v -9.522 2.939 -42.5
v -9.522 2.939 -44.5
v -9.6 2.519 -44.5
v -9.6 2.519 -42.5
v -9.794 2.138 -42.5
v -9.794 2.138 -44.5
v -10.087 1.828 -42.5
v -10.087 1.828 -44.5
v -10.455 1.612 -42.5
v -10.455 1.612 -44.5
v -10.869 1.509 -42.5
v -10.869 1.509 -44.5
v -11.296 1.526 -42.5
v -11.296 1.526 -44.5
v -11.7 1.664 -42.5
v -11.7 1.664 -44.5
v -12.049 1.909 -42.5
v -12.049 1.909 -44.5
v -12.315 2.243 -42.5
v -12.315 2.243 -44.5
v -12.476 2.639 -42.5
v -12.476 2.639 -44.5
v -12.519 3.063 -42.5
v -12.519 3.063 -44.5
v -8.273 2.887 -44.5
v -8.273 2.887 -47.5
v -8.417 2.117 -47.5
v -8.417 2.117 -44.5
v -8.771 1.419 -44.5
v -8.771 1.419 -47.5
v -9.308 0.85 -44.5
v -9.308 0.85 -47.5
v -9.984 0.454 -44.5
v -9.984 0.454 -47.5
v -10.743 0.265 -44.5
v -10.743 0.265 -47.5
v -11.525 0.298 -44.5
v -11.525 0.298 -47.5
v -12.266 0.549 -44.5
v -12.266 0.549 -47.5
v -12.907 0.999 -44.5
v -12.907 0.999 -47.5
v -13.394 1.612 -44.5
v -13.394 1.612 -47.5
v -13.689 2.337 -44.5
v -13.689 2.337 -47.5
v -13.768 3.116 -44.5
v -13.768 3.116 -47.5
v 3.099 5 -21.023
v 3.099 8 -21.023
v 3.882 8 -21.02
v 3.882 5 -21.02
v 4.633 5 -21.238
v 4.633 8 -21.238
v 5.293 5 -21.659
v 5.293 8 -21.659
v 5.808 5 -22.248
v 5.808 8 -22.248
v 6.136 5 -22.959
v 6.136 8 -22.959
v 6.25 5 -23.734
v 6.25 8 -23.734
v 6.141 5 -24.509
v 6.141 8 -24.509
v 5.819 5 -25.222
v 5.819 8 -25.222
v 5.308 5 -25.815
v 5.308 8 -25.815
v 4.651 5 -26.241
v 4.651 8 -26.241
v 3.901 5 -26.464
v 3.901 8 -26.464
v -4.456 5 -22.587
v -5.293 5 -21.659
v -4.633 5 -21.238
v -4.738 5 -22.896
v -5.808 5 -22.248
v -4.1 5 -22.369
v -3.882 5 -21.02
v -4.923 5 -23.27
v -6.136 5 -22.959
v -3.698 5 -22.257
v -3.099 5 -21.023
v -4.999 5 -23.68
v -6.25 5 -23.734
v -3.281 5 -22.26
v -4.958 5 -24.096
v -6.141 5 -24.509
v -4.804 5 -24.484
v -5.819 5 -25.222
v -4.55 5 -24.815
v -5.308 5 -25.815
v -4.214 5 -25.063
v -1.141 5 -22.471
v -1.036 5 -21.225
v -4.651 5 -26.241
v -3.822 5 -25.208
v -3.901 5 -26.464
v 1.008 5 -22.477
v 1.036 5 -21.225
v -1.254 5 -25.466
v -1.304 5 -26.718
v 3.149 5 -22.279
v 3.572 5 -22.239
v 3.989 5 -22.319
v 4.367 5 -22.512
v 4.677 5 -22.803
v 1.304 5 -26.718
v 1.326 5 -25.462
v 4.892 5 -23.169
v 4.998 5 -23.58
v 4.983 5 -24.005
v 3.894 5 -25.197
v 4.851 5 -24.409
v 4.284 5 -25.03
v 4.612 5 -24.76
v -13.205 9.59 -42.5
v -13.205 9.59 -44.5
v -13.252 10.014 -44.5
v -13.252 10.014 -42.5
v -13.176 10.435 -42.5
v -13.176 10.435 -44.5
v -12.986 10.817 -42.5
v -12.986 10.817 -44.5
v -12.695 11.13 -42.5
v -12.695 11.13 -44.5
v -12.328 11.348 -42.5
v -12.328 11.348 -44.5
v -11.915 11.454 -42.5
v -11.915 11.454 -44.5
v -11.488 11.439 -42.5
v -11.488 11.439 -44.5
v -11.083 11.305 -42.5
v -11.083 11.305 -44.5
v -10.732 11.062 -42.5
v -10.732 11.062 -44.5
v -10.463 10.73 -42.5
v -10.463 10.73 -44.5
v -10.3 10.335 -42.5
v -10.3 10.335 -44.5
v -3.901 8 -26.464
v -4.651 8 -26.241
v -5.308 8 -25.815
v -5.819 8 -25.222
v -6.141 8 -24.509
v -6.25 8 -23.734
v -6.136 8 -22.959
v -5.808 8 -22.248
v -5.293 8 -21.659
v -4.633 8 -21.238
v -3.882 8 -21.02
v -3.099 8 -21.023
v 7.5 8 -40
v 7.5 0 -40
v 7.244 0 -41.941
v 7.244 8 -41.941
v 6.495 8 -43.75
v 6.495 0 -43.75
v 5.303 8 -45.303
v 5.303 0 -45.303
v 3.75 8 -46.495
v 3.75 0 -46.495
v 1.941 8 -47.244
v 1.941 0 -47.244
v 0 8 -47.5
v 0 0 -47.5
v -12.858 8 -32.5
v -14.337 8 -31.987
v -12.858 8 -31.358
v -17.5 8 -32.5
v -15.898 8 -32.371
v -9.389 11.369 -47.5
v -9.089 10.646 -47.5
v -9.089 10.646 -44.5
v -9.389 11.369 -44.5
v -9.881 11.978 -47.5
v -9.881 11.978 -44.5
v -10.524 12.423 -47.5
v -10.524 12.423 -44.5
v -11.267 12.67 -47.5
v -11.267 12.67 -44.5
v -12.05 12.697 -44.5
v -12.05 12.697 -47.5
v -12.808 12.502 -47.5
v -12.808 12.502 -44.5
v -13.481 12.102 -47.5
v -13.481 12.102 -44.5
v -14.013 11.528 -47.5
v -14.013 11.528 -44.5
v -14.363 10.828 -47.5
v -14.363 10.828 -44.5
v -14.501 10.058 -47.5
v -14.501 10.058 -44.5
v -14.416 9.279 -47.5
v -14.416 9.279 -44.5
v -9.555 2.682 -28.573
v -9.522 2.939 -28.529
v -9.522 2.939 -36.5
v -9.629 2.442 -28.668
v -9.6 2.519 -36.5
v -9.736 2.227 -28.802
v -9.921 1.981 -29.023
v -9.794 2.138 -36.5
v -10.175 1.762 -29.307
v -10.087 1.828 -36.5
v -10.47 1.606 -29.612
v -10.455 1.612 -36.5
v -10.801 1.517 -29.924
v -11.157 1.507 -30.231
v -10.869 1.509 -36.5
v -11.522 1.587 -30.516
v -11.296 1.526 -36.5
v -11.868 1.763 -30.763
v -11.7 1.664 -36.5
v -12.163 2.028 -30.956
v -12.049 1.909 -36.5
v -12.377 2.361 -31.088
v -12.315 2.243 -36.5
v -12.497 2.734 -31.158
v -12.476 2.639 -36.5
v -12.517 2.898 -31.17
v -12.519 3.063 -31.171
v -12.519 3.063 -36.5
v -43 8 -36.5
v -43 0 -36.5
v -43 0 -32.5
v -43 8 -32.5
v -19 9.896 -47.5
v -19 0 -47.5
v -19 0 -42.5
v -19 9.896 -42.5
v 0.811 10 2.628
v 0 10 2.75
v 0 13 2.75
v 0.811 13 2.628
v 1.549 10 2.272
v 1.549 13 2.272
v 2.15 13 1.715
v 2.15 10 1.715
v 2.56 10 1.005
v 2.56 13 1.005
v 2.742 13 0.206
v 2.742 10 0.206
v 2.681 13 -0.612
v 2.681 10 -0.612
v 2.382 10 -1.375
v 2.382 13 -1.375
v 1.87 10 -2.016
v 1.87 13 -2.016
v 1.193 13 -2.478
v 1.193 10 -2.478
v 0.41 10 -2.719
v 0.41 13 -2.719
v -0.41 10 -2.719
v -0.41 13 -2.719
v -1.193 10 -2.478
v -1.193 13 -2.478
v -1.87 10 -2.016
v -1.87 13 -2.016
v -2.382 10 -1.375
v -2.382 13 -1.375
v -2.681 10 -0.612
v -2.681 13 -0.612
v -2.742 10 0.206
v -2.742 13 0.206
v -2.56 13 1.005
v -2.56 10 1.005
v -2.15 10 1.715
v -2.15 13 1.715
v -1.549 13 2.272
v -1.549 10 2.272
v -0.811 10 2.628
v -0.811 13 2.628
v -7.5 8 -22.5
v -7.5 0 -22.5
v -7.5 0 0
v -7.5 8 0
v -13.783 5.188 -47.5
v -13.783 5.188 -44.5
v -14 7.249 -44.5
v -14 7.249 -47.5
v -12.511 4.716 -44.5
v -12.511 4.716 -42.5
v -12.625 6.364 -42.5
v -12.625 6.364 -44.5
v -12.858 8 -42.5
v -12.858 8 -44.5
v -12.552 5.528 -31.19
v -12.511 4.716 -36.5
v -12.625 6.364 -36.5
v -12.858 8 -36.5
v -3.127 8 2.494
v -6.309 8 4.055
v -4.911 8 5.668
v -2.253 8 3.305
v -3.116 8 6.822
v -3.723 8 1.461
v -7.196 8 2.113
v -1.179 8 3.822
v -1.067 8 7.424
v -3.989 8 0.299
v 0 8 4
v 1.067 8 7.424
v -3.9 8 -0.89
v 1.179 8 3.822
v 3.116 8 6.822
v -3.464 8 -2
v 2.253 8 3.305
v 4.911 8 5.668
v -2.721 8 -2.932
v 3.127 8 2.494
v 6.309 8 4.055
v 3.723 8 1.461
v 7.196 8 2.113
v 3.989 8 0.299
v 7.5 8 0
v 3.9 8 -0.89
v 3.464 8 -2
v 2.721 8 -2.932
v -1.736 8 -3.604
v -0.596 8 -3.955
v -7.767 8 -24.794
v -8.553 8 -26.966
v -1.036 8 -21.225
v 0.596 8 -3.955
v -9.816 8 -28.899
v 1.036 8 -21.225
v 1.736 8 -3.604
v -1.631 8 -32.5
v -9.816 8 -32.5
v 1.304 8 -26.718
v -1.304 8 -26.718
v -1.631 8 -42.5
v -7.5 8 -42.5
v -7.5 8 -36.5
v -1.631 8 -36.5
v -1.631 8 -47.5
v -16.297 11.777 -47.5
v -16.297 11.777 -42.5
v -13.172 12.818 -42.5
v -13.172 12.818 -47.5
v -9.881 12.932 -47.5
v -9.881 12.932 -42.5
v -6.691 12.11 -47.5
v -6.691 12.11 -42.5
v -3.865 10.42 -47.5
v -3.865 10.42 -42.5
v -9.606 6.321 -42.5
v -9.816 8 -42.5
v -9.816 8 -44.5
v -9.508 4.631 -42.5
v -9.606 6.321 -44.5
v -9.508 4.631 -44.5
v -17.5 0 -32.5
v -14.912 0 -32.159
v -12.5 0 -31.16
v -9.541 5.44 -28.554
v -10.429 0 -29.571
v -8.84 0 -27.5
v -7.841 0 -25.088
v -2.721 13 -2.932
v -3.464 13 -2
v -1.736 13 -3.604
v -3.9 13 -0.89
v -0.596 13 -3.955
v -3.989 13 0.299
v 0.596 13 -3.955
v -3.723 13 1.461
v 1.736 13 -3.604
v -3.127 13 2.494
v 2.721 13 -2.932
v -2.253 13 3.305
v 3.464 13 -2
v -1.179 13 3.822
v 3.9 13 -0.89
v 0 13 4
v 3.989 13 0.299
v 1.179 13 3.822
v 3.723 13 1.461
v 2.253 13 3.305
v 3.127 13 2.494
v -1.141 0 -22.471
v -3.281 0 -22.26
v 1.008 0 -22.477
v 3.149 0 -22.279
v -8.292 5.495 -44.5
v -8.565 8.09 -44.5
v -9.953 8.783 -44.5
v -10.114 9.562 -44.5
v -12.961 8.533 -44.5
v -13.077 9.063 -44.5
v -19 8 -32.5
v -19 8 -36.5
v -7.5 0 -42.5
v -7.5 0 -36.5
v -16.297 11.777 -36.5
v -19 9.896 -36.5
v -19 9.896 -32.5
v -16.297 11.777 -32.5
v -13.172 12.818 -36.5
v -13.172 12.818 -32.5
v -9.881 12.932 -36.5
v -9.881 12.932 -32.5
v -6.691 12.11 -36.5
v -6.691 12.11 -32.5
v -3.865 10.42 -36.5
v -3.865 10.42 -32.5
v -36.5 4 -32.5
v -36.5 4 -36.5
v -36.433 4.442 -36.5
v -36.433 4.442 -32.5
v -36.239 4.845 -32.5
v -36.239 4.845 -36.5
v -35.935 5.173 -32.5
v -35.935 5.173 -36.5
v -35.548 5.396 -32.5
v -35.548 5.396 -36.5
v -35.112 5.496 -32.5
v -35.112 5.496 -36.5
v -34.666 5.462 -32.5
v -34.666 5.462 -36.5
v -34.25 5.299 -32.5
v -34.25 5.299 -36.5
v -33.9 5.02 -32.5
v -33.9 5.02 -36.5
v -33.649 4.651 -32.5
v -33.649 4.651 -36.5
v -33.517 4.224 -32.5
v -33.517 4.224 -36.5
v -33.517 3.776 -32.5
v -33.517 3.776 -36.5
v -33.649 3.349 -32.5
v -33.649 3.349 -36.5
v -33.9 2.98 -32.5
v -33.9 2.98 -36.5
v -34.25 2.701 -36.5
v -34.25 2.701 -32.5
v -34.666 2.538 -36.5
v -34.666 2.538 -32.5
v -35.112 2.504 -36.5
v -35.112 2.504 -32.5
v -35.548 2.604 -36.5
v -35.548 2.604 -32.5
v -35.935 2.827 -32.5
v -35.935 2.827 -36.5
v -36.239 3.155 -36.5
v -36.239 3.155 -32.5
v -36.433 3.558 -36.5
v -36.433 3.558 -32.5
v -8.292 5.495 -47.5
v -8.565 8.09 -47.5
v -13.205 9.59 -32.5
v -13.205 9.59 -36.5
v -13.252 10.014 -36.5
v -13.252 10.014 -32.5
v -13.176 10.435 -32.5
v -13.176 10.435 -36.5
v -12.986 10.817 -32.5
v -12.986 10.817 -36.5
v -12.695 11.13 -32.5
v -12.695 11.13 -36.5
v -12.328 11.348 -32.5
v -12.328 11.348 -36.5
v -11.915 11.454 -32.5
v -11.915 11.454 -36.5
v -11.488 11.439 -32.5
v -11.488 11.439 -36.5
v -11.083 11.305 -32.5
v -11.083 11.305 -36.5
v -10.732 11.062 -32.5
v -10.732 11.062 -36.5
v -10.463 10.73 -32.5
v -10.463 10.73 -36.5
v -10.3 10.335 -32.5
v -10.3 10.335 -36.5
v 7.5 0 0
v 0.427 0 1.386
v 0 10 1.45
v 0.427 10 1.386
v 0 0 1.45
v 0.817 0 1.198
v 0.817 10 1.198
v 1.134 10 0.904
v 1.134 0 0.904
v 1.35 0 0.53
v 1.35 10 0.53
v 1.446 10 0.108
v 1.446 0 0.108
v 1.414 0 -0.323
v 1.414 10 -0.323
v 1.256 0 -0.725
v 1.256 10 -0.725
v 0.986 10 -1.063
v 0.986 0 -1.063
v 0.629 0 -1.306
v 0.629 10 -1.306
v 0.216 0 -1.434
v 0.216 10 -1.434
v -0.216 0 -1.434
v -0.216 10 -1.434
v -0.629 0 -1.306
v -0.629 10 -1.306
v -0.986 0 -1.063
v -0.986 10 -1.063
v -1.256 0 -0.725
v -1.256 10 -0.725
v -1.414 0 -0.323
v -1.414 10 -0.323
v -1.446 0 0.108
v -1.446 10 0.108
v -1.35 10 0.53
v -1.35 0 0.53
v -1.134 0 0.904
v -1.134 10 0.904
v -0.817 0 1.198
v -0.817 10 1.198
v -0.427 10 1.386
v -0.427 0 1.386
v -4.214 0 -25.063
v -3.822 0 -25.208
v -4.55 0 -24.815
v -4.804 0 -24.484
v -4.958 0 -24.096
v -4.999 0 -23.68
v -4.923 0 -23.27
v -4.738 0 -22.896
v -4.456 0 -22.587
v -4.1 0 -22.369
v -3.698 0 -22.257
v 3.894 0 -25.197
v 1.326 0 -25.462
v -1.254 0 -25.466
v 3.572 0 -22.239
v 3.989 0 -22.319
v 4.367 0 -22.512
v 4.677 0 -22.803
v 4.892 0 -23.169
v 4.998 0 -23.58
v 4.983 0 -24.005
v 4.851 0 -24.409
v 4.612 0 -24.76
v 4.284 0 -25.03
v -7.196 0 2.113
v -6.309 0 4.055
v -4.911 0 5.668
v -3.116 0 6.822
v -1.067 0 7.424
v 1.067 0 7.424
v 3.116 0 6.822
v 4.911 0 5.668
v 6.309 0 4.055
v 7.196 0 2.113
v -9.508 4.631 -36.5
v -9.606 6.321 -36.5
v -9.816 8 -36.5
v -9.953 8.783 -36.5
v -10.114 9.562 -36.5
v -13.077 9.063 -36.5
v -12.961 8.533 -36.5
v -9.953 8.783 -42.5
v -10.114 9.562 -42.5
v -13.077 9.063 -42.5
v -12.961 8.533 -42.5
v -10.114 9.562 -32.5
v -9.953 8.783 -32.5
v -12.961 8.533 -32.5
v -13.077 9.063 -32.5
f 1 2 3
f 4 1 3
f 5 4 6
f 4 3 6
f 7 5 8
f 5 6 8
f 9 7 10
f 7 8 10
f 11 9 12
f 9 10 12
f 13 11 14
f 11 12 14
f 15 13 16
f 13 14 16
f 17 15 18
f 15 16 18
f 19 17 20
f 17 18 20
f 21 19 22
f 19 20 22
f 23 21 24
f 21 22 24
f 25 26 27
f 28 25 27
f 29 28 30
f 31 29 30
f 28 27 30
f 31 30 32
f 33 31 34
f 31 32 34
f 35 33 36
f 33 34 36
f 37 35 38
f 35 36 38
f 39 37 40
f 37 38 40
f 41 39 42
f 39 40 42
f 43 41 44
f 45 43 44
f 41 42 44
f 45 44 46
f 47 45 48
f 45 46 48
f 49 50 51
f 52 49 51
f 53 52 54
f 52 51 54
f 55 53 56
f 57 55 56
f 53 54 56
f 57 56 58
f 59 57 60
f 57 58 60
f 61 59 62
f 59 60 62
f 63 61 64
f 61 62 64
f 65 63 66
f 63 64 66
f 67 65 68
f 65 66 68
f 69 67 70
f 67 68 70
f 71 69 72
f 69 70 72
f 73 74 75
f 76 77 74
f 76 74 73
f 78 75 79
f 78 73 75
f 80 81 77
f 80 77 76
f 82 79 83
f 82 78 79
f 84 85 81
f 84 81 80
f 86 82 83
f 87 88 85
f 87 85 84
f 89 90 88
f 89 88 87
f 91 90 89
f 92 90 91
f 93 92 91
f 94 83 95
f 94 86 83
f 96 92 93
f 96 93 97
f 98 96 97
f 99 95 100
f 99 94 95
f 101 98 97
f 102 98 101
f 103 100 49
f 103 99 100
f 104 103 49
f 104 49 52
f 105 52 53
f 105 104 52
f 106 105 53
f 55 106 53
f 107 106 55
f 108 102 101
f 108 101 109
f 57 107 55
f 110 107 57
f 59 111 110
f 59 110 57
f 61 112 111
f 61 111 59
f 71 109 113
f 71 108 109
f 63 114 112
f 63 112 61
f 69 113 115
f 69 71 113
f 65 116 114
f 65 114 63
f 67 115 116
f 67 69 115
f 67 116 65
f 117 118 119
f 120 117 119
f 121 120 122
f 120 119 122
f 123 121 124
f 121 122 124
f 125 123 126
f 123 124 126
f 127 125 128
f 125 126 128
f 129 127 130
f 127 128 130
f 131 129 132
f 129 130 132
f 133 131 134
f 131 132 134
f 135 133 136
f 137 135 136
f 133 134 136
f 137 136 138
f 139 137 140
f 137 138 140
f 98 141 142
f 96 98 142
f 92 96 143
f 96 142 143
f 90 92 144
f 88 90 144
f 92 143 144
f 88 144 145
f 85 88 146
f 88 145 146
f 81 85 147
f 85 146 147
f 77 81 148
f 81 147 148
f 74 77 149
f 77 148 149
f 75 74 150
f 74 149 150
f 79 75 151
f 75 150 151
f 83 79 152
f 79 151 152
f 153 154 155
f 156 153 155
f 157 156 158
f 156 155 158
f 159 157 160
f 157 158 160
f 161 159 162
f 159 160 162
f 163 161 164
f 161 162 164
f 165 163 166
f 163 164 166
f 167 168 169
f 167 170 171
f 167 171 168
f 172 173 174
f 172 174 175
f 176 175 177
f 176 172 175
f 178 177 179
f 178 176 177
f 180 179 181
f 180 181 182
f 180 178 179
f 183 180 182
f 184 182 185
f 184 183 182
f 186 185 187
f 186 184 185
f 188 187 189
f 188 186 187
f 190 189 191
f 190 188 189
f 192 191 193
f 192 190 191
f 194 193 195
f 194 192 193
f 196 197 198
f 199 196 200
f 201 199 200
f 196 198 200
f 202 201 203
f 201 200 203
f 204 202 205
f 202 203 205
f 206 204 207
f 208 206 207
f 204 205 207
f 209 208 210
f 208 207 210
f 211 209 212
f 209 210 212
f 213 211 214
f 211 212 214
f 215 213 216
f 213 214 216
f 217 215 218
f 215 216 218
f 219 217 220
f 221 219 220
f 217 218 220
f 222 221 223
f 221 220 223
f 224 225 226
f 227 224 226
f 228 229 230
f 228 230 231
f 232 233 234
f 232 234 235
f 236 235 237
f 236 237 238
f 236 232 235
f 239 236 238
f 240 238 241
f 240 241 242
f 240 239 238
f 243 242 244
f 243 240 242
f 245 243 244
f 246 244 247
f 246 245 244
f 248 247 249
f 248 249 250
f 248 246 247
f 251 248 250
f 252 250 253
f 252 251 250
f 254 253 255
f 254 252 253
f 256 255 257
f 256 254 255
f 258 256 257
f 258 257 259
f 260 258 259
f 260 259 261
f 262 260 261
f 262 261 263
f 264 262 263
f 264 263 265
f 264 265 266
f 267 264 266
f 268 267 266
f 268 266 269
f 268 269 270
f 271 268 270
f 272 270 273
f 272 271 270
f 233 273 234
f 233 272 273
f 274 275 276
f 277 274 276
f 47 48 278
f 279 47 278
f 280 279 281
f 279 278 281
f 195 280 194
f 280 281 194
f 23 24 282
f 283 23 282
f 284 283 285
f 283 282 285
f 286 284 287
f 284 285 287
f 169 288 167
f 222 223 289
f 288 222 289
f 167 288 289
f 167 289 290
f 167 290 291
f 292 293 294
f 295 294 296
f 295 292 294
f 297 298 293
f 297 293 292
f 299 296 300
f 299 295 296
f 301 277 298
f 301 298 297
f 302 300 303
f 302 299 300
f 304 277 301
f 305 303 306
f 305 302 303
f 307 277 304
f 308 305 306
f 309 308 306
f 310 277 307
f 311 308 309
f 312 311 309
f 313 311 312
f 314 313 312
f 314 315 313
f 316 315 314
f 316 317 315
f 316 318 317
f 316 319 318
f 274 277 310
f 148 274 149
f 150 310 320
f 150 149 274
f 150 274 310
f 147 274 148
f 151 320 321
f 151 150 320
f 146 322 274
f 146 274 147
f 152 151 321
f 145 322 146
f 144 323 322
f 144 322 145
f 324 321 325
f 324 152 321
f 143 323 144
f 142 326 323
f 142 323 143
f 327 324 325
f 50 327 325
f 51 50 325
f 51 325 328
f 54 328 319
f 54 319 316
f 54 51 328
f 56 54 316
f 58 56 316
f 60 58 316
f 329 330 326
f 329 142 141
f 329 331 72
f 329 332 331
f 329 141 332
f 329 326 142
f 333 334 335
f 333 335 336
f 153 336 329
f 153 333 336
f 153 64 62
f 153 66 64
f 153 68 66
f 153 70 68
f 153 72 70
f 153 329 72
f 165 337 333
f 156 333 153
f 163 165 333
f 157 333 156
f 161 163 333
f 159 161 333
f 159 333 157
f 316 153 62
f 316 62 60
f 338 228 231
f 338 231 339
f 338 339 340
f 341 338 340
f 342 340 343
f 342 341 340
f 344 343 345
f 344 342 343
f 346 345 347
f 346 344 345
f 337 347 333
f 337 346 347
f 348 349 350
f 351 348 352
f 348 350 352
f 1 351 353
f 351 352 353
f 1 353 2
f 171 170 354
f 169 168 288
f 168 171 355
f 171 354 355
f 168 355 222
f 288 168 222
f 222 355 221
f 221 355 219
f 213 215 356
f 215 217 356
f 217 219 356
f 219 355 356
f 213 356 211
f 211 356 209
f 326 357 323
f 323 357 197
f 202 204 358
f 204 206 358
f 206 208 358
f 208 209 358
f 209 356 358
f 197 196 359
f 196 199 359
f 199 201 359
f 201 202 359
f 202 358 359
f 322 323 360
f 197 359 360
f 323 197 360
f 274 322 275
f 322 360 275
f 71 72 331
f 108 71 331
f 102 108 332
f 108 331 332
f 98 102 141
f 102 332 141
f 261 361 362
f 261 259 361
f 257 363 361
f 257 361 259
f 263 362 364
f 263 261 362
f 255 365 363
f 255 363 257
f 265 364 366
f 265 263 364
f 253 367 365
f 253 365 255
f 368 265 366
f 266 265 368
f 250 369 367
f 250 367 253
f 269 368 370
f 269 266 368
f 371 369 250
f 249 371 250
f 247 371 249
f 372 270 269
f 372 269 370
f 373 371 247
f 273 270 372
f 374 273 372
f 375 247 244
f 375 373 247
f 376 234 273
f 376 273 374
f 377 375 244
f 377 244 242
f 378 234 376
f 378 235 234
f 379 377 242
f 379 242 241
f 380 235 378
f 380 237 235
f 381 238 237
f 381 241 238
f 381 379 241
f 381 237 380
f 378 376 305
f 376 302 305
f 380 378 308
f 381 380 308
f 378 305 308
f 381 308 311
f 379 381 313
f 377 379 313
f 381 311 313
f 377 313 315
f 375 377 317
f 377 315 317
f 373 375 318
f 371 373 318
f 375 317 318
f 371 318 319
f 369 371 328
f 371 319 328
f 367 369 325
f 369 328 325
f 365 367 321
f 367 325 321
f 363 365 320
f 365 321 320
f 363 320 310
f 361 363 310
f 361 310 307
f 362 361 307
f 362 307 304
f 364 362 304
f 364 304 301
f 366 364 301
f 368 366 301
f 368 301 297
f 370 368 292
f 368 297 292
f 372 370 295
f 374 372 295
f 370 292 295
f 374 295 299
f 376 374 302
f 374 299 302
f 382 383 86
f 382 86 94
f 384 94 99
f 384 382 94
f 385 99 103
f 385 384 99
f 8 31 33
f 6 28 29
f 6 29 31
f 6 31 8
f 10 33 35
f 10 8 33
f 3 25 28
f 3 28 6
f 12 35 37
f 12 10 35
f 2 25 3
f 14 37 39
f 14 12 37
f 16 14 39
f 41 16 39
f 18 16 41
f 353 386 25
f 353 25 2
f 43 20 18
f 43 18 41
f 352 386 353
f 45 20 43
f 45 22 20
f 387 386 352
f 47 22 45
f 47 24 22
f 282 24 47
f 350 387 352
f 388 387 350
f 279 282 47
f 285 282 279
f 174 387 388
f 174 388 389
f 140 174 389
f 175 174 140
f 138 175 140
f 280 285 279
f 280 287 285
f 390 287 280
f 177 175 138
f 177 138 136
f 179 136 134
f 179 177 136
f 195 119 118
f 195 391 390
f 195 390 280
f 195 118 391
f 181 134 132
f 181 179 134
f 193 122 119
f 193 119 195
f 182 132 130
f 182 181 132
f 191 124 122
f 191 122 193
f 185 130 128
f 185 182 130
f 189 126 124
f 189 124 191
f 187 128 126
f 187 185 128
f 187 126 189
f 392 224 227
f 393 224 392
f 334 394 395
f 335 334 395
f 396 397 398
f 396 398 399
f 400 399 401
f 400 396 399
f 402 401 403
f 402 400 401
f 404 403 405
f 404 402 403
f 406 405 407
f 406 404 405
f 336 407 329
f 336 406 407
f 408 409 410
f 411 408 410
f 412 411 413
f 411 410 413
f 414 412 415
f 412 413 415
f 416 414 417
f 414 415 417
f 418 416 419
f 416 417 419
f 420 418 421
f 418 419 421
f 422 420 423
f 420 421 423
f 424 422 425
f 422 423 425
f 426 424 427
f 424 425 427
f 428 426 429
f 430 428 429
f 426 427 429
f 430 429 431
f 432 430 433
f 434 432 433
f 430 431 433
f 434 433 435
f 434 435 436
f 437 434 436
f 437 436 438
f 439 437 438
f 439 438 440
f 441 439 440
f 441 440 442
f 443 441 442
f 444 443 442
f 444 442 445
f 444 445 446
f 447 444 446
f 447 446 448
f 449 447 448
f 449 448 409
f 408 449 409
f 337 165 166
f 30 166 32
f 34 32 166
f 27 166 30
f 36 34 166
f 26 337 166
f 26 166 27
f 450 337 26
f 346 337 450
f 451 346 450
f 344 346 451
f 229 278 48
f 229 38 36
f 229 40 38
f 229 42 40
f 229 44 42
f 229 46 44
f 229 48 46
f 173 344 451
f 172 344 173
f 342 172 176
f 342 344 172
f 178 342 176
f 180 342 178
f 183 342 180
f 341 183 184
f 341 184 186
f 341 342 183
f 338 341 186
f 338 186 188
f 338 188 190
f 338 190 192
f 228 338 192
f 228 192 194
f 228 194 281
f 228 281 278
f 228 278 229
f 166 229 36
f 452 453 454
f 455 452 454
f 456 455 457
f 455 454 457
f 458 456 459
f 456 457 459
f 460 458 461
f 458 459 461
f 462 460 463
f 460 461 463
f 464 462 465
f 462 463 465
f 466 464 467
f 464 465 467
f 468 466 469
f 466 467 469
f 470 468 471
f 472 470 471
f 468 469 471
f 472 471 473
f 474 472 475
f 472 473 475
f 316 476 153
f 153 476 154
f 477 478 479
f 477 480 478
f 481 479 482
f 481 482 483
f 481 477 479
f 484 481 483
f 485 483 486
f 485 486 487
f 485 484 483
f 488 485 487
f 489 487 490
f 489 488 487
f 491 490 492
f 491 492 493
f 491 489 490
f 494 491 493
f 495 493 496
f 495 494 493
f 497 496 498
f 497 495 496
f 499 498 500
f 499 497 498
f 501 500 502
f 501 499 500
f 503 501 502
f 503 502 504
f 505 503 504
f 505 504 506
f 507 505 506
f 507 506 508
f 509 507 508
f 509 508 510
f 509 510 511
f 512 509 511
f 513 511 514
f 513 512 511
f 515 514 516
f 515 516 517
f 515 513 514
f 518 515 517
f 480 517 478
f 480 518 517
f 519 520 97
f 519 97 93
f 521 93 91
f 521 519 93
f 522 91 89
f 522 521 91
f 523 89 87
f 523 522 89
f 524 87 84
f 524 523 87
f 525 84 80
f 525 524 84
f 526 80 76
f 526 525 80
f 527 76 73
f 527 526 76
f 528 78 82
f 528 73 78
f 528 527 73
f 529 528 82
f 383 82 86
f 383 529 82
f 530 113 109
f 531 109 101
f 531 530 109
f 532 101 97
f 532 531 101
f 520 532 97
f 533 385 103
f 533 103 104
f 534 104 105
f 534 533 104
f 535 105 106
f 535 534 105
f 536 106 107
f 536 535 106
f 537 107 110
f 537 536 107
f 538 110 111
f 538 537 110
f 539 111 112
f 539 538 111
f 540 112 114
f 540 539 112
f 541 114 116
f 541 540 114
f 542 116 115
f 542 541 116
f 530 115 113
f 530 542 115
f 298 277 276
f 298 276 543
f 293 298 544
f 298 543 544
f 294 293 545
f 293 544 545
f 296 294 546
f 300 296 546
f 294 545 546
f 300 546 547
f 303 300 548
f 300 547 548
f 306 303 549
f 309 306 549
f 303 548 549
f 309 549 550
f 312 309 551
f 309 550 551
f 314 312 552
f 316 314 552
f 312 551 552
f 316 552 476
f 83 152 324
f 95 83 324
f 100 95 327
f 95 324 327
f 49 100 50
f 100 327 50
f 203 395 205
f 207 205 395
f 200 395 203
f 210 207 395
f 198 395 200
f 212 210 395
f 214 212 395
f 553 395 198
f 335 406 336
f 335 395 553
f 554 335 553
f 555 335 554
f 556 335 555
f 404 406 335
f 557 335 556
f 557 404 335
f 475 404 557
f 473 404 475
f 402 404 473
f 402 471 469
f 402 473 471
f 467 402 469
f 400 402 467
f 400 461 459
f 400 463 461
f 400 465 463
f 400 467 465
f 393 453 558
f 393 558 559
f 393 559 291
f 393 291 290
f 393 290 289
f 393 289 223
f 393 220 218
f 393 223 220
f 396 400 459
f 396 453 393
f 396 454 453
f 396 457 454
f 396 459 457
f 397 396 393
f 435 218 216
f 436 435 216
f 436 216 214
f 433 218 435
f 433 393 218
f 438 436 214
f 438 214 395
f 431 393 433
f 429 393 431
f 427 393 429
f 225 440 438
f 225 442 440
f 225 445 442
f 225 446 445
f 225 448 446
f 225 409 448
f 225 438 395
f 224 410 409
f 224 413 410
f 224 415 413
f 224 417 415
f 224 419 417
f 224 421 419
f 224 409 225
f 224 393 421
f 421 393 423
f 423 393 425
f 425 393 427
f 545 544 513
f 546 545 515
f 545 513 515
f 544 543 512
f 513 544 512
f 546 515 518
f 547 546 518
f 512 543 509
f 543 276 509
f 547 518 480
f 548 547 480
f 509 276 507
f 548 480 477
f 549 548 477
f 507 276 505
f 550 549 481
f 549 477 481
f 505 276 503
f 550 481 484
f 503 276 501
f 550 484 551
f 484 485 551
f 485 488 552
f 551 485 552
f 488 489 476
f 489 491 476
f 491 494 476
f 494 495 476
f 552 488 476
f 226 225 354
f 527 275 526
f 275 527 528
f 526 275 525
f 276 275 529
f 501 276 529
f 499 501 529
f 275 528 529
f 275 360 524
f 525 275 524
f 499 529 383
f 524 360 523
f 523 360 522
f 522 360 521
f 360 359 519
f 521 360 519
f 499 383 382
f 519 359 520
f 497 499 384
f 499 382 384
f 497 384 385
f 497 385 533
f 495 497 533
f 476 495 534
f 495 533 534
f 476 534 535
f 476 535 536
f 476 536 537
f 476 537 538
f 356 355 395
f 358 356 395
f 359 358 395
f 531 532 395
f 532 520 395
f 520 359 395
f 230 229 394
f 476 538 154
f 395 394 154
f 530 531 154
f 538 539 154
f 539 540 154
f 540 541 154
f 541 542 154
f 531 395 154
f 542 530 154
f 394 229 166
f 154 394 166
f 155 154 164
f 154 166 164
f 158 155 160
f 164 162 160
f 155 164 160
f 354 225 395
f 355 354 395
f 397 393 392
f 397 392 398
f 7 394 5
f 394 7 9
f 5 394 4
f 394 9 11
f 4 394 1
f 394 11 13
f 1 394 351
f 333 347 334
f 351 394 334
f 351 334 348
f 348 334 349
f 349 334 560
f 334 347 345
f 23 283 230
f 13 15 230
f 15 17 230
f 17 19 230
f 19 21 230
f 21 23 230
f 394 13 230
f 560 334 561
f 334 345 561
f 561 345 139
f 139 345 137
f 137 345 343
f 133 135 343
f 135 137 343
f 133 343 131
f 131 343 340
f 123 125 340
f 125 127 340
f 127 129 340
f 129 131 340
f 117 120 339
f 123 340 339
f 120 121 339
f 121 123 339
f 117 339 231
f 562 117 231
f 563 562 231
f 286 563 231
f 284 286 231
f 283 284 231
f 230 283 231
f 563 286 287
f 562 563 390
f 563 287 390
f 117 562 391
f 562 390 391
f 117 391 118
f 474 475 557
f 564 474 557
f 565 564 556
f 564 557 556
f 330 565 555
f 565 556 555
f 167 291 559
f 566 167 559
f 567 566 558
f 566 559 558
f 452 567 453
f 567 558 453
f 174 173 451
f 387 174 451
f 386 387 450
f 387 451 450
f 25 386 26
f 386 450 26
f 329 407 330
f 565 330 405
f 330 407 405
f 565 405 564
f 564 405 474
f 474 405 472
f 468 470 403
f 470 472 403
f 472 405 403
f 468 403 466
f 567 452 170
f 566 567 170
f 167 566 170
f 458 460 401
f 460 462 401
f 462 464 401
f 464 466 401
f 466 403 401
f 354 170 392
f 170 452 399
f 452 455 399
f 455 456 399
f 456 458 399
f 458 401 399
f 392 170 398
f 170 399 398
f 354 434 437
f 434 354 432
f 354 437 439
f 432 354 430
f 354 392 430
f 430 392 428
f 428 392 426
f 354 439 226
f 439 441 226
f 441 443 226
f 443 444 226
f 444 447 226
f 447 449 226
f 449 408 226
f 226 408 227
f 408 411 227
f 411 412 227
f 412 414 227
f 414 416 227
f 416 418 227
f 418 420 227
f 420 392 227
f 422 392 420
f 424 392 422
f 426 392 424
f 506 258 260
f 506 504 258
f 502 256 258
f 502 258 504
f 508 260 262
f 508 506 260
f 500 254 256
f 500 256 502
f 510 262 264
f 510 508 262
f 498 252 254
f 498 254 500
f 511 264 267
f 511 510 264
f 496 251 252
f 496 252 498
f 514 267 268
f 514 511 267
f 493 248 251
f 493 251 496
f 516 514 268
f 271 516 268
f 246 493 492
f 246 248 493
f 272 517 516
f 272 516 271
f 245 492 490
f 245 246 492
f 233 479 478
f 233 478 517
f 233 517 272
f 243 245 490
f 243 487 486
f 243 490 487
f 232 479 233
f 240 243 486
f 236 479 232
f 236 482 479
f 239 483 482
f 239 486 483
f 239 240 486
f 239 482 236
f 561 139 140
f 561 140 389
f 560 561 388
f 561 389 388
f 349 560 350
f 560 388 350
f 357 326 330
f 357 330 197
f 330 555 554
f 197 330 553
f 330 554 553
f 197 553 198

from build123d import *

# Parameters (mm, degrees)
SKETCH1_R           = 1.45
BOSS_EXTRUDE1_DEPTH = 8
SKETCH2_R           = 4
SKETCH2_R_2         = 1.45
BOSS_EXTRUDE2_DEPTH = 2
SKETCH4_R           = 4
SKETCH4_R_2         = 2.75
BOSS_EXTRUDE3_DEPTH = 3
CUT_EXTRUDE1_DEPTH  = 3
CUT_EXTRUDE2_REACH  = 73.014
SKETCH6_R           = 1.5
CUT_EXTRUDE3_DEPTH  = 3
BOSS_EXTRUDE8_DEPTH = 5
BOSS_EXTRUDE9_START = -11
BOSS_EXTRUDE9_DEPTH = 4
CUT_EXTRUDE6_DEPTH  = 72.01408311
SKETCH6_7_R         = 1.5
CUT_EXTRUDE7_DEPTH  = 3


with BuildPart() as part:
    # Sketch1 → Boss-Extrude1 (new body)
    with BuildSketch(Plane(origin=(0, 0, 0), x_dir=(1, 0, 0), z_dir=(0, 1, 0))):
        with BuildLine():
            Line((-7.5, 36.5), (-43, 36.5))
            Line((-43, 36.5), (-43, 32.5))
            Line((-43, 32.5), (-17.5, 32.5))
            ThreePointArc((-17.5, 32.5), (-10.428932188, 29.571067812), (-7.5, 22.5))
            Line((-7.5, 22.5), (-7.5, 0))
            ThreePointArc((-7.5, 0), (0, -7.5), (7.5, 0))
            Line((7.5, 0), (7.5, 40))
            ThreePointArc((7.5, 40), (5.303300859, 45.303300859), (0, 47.5))
            Line((0, 47.5), (-19, 47.5))
            Line((-19, 47.5), (-19, 42.5))
            Line((-19, 42.5), (-7.5, 42.5))
            Line((-7.5, 42.5), (-7.5, 36.5))
        make_face()
        with Locations(Location((0, 0, 0), (0, 0, 270))):
            Circle(SKETCH1_R, mode=Mode.SUBTRACT)
        with BuildLine():
            ThreePointArc((-3.822328563, 25.208378945), (-4.975312132, 23.472395947), (-3.280610142, 22.259550844))
            ThreePointArc((-3.280610142, 22.259550844), (-0.06671842, 22.49990123), (3.148542183, 22.278615056))
            ThreePointArc((3.148542183, 22.278615056), (4.95957959, 23.370856111), (3.89359262, 25.197470135))
            ThreePointArc((3.89359262, 25.197470135), (0.03604708, 25.496495157), (-3.822328563, 25.208378945))
        make_face(mode=Mode.SUBTRACT)
    extrude(amount=BOSS_EXTRUDE1_DEPTH)

    # Sketch2 → Boss-Extrude2 (add)
    with BuildSketch(Plane(origin=(0, 8, 0), x_dir=(1, 0, 0), z_dir=(0, 1, 0))):
        with Locations(Location((0, 0, 0), (0, 0, 270))):
            Circle(SKETCH2_R)
        with Locations(Location((0, 0, 0), (0, 0, 270))):
            Circle(SKETCH2_R_2, mode=Mode.SUBTRACT)
    extrude(amount=BOSS_EXTRUDE2_DEPTH)

    # Sketch4 → Boss-Extrude3 (add)
    with BuildSketch(Plane(origin=(0, 10, 0), x_dir=(1, 0, 0), z_dir=(0, 1, 0))):
        with Locations(Location((0, 0, 0), (0, 0, 270))):
            Circle(SKETCH4_R)
        with Locations(Location((0, 0, 0), (0, 0, 270))):
            Circle(SKETCH4_R_2, mode=Mode.SUBTRACT)
    extrude(amount=BOSS_EXTRUDE3_DEPTH)

    # Sketch5 → Cut-Extrude1 (cut)
    with BuildSketch(Plane(origin=(0, 8, 0), x_dir=(1, 0, 0), z_dir=(0, 1, 0))):
        with BuildLine():
            ThreePointArc((-3.901041667, 26.464020366), (-6.220600225, 23.342378475), (-3.098958333, 21.022819917))
            ThreePointArc((-3.098958333, 21.022819917), (0, 21.25), (3.098958333, 21.022819917))
            ThreePointArc((3.098958333, 21.022819917), (6.220600225, 23.342378475), (3.901041667, 26.464020366))
            ThreePointArc((3.901041667, 26.464020366), (0, 26.75), (-3.901041667, 26.464020366))
        make_face()
    extrude(amount=-CUT_EXTRUDE1_DEPTH, mode=Mode.SUBTRACT)

    # Sketch6 → Cut-Extrude2 (cut, up to next)
    with BuildSketch(Plane(origin=(0, 0, -47.5), x_dir=(-1, 0, 0), z_dir=(0, 0, -1)), mode=Mode.PRIVATE) as cut_extrude2_sk1:
        with Locations((35, 4)):
            Circle(SKETCH6_R)
    cut_extrude2_tool1 = extrude(cut_extrude2_sk1.sketch, amount=-CUT_EXTRUDE2_REACH, mode=Mode.PRIVATE) & part.part
    # Sketch6 → Cut-Extrude2 (cut, up to next)
    with BuildSketch(Plane(origin=(0, 0, -47.5), x_dir=(-1, 0, 0), z_dir=(0, 0, -1)), mode=Mode.PRIVATE) as cut_extrude2_sk2:
        with BuildLine():
            ThreePointArc((13.205467269, 9.590021738), (12.125166536, 11.415658703), (10.299529571, 10.33535797))
            ThreePointArc((10.299529571, 10.33535797), (9.639691668, 6.665475813), (9.522099126, 2.938601373))
            ThreePointArc((9.522099126, 2.938601373), (11.083234391, 1.502336535), (12.519499229, 3.0634718))
            ThreePointArc((12.519499229, 3.0634718), (12.623257354, 6.351890424), (13.205467269, 9.590021738))
        make_face()
    cut_extrude2_tool2 = extrude(cut_extrude2_sk2.sketch, amount=-CUT_EXTRUDE2_REACH, mode=Mode.PRIVATE) & part.part
    add(cut_extrude2_tool1.solids().sort_by_distance((-35, 4, -47.5))[0], mode=Mode.SUBTRACT)
    add(cut_extrude2_tool2.solids().sort_by_distance((-11.259305, 6.495248, -47.5))[0], mode=Mode.SUBTRACT)

    # Sketch6<3> → Cut-Extrude3 (cut)
    with BuildSketch(Plane(origin=(0, 0, -47.5), x_dir=(-1, 0, 0), z_dir=(0, 0, -1))):
        with BuildLine():
            ThreePointArc((9.088722197, 10.645914733), (8.396539299, 6.796136392), (8.273182416, 2.886572028))
            ThreePointArc((8.273182416, 2.886572028), (11.135263735, 0.253419825), (13.768415938, 3.115501144))
            ThreePointArc((13.768415938, 3.115501144), (13.866409723, 6.221229844), (14.416274643, 9.279464975))
            ThreePointArc((14.416274643, 9.279464975), (12.435723299, 12.626466077), (9.088722197, 10.645914733))
        make_face()
        with BuildLine():
            ThreePointArc((10.299529571, 10.33535797), (9.639691668, 6.665475813), (9.522099126, 2.938601373))
            ThreePointArc((9.522099126, 2.938601373), (11.083234391, 1.502336535), (12.519499229, 3.0634718))
            ThreePointArc((12.519499229, 3.0634718), (12.623257354, 6.351890424), (13.205467269, 9.590021738))
            ThreePointArc((13.205467269, 9.590021738), (12.125166536, 11.415658703), (10.299529571, 10.33535797))
        make_face(mode=Mode.SUBTRACT)
    extrude(amount=-CUT_EXTRUDE3_DEPTH, mode=Mode.SUBTRACT)

    # Sketch8 → Boss-Extrude8 (add)
    with BuildSketch(Plane(origin=(0, 0, -47.5), x_dir=(-1, 0, 0), z_dir=(0, 0, -1))):
        with BuildLine():
            Line((19, 8), (19, 9.895699086))
            ThreePointArc((19, 9.895699086), (9.880775279, 12.931961804), (1.631235681, 8))
            Line((1.631235681, 8), (19, 8))
        make_face()
    extrude(amount=-BOSS_EXTRUDE8_DEPTH)

    # Sketch8<3> → Boss-Extrude9 (add)
    with BuildSketch(Plane(origin=(0, 0, -47.5), x_dir=(-1, 0, 0), z_dir=(0, 0, -1)).offset(BOSS_EXTRUDE9_START)):
        with BuildLine():
            Line((19, 8), (19, 9.895699086))
            ThreePointArc((19, 9.895699086), (9.880775279, 12.931961804), (1.631235681, 8))
            Line((1.631235681, 8), (19, 8))
        make_face()
    extrude(amount=-BOSS_EXTRUDE9_DEPTH)

    # Sketch6<6> → Cut-Extrude6 (cut, through all)
    with BuildSketch(Plane(origin=(0, 0, -47.5), x_dir=(-1, 0, 0), z_dir=(0, 0, -1))):
        with BuildLine():
            ThreePointArc((12.519499229, 3.0634718), (12.552838265, 5.541080797), (12.858410175, 8))
            Line((12.858410175, 8), (9.815679481, 8))
            ThreePointArc((9.815679481, 8), (9.542788681, 5.476615002), (9.522099126, 2.938601373))
            ThreePointArc((9.522099126, 2.938601373), (11.083234391, 1.502336535), (12.519499229, 3.0634718))
        make_face()
        with BuildLine():
            ThreePointArc((12.858410175, 8), (13.017557947, 8.798149788), (13.205467269, 9.590021738))
            ThreePointArc((13.205467269, 9.590021738), (12.125166536, 11.415658703), (10.299529571, 10.33535797))
            ThreePointArc((10.299529571, 10.33535797), (10.030287022, 9.17333875), (9.815679481, 8))
            Line((9.815679481, 8), (12.858410175, 8))
        make_face()
    extrude(amount=-CUT_EXTRUDE6_DEPTH, mode=Mode.SUBTRACT)

    # Sketch6<7> → Cut-Extrude7 (cut)
    # profile 1 of 2: a face of its own
    with BuildSketch(Plane(origin=(0, 0, -47.5), x_dir=(-1, 0, 0), z_dir=(0, 0, -1))):
        with Locations((35, 4)):
            Circle(SKETCH6_7_R)
    # profile 2 of 2: a face of its own
    with BuildSketch(Plane(origin=(0, 0, -47.5), x_dir=(-1, 0, 0), z_dir=(0, 0, -1))):
        with BuildLine():
            ThreePointArc((14.416274643, 9.279464975), (13.866409723, 6.221229844), (13.768415938, 3.115501144))
            ThreePointArc((13.768415938, 3.115501144), (11.135263735, 0.253419825), (8.273182416, 2.886572028))
            ThreePointArc((8.273182416, 2.886572028), (8.396539299, 6.796136392), (9.088722197, 10.645914733))
            ThreePointArc((9.088722197, 10.645914733), (12.435723299, 12.626466077), (14.416274643, 9.279464975))
        make_face()
        with BuildLine():
            ThreePointArc((13.205467269, 9.590021738), (12.125166536, 11.415658703), (10.299529571, 10.33535797))
            ThreePointArc((10.299529571, 10.33535797), (9.639691668, 6.665475813), (9.522099126, 2.938601373))
            ThreePointArc((9.522099126, 2.938601373), (11.083234391, 1.502336535), (12.519499229, 3.0634718))
            ThreePointArc((12.519499229, 3.0634718), (12.623257354, 6.351890424), (13.205467269, 9.590021738))
        make_face(mode=Mode.SUBTRACT)
    extrude(amount=-CUT_EXTRUDE7_DEPTH, mode=Mode.SUBTRACT)


solid = part.part
